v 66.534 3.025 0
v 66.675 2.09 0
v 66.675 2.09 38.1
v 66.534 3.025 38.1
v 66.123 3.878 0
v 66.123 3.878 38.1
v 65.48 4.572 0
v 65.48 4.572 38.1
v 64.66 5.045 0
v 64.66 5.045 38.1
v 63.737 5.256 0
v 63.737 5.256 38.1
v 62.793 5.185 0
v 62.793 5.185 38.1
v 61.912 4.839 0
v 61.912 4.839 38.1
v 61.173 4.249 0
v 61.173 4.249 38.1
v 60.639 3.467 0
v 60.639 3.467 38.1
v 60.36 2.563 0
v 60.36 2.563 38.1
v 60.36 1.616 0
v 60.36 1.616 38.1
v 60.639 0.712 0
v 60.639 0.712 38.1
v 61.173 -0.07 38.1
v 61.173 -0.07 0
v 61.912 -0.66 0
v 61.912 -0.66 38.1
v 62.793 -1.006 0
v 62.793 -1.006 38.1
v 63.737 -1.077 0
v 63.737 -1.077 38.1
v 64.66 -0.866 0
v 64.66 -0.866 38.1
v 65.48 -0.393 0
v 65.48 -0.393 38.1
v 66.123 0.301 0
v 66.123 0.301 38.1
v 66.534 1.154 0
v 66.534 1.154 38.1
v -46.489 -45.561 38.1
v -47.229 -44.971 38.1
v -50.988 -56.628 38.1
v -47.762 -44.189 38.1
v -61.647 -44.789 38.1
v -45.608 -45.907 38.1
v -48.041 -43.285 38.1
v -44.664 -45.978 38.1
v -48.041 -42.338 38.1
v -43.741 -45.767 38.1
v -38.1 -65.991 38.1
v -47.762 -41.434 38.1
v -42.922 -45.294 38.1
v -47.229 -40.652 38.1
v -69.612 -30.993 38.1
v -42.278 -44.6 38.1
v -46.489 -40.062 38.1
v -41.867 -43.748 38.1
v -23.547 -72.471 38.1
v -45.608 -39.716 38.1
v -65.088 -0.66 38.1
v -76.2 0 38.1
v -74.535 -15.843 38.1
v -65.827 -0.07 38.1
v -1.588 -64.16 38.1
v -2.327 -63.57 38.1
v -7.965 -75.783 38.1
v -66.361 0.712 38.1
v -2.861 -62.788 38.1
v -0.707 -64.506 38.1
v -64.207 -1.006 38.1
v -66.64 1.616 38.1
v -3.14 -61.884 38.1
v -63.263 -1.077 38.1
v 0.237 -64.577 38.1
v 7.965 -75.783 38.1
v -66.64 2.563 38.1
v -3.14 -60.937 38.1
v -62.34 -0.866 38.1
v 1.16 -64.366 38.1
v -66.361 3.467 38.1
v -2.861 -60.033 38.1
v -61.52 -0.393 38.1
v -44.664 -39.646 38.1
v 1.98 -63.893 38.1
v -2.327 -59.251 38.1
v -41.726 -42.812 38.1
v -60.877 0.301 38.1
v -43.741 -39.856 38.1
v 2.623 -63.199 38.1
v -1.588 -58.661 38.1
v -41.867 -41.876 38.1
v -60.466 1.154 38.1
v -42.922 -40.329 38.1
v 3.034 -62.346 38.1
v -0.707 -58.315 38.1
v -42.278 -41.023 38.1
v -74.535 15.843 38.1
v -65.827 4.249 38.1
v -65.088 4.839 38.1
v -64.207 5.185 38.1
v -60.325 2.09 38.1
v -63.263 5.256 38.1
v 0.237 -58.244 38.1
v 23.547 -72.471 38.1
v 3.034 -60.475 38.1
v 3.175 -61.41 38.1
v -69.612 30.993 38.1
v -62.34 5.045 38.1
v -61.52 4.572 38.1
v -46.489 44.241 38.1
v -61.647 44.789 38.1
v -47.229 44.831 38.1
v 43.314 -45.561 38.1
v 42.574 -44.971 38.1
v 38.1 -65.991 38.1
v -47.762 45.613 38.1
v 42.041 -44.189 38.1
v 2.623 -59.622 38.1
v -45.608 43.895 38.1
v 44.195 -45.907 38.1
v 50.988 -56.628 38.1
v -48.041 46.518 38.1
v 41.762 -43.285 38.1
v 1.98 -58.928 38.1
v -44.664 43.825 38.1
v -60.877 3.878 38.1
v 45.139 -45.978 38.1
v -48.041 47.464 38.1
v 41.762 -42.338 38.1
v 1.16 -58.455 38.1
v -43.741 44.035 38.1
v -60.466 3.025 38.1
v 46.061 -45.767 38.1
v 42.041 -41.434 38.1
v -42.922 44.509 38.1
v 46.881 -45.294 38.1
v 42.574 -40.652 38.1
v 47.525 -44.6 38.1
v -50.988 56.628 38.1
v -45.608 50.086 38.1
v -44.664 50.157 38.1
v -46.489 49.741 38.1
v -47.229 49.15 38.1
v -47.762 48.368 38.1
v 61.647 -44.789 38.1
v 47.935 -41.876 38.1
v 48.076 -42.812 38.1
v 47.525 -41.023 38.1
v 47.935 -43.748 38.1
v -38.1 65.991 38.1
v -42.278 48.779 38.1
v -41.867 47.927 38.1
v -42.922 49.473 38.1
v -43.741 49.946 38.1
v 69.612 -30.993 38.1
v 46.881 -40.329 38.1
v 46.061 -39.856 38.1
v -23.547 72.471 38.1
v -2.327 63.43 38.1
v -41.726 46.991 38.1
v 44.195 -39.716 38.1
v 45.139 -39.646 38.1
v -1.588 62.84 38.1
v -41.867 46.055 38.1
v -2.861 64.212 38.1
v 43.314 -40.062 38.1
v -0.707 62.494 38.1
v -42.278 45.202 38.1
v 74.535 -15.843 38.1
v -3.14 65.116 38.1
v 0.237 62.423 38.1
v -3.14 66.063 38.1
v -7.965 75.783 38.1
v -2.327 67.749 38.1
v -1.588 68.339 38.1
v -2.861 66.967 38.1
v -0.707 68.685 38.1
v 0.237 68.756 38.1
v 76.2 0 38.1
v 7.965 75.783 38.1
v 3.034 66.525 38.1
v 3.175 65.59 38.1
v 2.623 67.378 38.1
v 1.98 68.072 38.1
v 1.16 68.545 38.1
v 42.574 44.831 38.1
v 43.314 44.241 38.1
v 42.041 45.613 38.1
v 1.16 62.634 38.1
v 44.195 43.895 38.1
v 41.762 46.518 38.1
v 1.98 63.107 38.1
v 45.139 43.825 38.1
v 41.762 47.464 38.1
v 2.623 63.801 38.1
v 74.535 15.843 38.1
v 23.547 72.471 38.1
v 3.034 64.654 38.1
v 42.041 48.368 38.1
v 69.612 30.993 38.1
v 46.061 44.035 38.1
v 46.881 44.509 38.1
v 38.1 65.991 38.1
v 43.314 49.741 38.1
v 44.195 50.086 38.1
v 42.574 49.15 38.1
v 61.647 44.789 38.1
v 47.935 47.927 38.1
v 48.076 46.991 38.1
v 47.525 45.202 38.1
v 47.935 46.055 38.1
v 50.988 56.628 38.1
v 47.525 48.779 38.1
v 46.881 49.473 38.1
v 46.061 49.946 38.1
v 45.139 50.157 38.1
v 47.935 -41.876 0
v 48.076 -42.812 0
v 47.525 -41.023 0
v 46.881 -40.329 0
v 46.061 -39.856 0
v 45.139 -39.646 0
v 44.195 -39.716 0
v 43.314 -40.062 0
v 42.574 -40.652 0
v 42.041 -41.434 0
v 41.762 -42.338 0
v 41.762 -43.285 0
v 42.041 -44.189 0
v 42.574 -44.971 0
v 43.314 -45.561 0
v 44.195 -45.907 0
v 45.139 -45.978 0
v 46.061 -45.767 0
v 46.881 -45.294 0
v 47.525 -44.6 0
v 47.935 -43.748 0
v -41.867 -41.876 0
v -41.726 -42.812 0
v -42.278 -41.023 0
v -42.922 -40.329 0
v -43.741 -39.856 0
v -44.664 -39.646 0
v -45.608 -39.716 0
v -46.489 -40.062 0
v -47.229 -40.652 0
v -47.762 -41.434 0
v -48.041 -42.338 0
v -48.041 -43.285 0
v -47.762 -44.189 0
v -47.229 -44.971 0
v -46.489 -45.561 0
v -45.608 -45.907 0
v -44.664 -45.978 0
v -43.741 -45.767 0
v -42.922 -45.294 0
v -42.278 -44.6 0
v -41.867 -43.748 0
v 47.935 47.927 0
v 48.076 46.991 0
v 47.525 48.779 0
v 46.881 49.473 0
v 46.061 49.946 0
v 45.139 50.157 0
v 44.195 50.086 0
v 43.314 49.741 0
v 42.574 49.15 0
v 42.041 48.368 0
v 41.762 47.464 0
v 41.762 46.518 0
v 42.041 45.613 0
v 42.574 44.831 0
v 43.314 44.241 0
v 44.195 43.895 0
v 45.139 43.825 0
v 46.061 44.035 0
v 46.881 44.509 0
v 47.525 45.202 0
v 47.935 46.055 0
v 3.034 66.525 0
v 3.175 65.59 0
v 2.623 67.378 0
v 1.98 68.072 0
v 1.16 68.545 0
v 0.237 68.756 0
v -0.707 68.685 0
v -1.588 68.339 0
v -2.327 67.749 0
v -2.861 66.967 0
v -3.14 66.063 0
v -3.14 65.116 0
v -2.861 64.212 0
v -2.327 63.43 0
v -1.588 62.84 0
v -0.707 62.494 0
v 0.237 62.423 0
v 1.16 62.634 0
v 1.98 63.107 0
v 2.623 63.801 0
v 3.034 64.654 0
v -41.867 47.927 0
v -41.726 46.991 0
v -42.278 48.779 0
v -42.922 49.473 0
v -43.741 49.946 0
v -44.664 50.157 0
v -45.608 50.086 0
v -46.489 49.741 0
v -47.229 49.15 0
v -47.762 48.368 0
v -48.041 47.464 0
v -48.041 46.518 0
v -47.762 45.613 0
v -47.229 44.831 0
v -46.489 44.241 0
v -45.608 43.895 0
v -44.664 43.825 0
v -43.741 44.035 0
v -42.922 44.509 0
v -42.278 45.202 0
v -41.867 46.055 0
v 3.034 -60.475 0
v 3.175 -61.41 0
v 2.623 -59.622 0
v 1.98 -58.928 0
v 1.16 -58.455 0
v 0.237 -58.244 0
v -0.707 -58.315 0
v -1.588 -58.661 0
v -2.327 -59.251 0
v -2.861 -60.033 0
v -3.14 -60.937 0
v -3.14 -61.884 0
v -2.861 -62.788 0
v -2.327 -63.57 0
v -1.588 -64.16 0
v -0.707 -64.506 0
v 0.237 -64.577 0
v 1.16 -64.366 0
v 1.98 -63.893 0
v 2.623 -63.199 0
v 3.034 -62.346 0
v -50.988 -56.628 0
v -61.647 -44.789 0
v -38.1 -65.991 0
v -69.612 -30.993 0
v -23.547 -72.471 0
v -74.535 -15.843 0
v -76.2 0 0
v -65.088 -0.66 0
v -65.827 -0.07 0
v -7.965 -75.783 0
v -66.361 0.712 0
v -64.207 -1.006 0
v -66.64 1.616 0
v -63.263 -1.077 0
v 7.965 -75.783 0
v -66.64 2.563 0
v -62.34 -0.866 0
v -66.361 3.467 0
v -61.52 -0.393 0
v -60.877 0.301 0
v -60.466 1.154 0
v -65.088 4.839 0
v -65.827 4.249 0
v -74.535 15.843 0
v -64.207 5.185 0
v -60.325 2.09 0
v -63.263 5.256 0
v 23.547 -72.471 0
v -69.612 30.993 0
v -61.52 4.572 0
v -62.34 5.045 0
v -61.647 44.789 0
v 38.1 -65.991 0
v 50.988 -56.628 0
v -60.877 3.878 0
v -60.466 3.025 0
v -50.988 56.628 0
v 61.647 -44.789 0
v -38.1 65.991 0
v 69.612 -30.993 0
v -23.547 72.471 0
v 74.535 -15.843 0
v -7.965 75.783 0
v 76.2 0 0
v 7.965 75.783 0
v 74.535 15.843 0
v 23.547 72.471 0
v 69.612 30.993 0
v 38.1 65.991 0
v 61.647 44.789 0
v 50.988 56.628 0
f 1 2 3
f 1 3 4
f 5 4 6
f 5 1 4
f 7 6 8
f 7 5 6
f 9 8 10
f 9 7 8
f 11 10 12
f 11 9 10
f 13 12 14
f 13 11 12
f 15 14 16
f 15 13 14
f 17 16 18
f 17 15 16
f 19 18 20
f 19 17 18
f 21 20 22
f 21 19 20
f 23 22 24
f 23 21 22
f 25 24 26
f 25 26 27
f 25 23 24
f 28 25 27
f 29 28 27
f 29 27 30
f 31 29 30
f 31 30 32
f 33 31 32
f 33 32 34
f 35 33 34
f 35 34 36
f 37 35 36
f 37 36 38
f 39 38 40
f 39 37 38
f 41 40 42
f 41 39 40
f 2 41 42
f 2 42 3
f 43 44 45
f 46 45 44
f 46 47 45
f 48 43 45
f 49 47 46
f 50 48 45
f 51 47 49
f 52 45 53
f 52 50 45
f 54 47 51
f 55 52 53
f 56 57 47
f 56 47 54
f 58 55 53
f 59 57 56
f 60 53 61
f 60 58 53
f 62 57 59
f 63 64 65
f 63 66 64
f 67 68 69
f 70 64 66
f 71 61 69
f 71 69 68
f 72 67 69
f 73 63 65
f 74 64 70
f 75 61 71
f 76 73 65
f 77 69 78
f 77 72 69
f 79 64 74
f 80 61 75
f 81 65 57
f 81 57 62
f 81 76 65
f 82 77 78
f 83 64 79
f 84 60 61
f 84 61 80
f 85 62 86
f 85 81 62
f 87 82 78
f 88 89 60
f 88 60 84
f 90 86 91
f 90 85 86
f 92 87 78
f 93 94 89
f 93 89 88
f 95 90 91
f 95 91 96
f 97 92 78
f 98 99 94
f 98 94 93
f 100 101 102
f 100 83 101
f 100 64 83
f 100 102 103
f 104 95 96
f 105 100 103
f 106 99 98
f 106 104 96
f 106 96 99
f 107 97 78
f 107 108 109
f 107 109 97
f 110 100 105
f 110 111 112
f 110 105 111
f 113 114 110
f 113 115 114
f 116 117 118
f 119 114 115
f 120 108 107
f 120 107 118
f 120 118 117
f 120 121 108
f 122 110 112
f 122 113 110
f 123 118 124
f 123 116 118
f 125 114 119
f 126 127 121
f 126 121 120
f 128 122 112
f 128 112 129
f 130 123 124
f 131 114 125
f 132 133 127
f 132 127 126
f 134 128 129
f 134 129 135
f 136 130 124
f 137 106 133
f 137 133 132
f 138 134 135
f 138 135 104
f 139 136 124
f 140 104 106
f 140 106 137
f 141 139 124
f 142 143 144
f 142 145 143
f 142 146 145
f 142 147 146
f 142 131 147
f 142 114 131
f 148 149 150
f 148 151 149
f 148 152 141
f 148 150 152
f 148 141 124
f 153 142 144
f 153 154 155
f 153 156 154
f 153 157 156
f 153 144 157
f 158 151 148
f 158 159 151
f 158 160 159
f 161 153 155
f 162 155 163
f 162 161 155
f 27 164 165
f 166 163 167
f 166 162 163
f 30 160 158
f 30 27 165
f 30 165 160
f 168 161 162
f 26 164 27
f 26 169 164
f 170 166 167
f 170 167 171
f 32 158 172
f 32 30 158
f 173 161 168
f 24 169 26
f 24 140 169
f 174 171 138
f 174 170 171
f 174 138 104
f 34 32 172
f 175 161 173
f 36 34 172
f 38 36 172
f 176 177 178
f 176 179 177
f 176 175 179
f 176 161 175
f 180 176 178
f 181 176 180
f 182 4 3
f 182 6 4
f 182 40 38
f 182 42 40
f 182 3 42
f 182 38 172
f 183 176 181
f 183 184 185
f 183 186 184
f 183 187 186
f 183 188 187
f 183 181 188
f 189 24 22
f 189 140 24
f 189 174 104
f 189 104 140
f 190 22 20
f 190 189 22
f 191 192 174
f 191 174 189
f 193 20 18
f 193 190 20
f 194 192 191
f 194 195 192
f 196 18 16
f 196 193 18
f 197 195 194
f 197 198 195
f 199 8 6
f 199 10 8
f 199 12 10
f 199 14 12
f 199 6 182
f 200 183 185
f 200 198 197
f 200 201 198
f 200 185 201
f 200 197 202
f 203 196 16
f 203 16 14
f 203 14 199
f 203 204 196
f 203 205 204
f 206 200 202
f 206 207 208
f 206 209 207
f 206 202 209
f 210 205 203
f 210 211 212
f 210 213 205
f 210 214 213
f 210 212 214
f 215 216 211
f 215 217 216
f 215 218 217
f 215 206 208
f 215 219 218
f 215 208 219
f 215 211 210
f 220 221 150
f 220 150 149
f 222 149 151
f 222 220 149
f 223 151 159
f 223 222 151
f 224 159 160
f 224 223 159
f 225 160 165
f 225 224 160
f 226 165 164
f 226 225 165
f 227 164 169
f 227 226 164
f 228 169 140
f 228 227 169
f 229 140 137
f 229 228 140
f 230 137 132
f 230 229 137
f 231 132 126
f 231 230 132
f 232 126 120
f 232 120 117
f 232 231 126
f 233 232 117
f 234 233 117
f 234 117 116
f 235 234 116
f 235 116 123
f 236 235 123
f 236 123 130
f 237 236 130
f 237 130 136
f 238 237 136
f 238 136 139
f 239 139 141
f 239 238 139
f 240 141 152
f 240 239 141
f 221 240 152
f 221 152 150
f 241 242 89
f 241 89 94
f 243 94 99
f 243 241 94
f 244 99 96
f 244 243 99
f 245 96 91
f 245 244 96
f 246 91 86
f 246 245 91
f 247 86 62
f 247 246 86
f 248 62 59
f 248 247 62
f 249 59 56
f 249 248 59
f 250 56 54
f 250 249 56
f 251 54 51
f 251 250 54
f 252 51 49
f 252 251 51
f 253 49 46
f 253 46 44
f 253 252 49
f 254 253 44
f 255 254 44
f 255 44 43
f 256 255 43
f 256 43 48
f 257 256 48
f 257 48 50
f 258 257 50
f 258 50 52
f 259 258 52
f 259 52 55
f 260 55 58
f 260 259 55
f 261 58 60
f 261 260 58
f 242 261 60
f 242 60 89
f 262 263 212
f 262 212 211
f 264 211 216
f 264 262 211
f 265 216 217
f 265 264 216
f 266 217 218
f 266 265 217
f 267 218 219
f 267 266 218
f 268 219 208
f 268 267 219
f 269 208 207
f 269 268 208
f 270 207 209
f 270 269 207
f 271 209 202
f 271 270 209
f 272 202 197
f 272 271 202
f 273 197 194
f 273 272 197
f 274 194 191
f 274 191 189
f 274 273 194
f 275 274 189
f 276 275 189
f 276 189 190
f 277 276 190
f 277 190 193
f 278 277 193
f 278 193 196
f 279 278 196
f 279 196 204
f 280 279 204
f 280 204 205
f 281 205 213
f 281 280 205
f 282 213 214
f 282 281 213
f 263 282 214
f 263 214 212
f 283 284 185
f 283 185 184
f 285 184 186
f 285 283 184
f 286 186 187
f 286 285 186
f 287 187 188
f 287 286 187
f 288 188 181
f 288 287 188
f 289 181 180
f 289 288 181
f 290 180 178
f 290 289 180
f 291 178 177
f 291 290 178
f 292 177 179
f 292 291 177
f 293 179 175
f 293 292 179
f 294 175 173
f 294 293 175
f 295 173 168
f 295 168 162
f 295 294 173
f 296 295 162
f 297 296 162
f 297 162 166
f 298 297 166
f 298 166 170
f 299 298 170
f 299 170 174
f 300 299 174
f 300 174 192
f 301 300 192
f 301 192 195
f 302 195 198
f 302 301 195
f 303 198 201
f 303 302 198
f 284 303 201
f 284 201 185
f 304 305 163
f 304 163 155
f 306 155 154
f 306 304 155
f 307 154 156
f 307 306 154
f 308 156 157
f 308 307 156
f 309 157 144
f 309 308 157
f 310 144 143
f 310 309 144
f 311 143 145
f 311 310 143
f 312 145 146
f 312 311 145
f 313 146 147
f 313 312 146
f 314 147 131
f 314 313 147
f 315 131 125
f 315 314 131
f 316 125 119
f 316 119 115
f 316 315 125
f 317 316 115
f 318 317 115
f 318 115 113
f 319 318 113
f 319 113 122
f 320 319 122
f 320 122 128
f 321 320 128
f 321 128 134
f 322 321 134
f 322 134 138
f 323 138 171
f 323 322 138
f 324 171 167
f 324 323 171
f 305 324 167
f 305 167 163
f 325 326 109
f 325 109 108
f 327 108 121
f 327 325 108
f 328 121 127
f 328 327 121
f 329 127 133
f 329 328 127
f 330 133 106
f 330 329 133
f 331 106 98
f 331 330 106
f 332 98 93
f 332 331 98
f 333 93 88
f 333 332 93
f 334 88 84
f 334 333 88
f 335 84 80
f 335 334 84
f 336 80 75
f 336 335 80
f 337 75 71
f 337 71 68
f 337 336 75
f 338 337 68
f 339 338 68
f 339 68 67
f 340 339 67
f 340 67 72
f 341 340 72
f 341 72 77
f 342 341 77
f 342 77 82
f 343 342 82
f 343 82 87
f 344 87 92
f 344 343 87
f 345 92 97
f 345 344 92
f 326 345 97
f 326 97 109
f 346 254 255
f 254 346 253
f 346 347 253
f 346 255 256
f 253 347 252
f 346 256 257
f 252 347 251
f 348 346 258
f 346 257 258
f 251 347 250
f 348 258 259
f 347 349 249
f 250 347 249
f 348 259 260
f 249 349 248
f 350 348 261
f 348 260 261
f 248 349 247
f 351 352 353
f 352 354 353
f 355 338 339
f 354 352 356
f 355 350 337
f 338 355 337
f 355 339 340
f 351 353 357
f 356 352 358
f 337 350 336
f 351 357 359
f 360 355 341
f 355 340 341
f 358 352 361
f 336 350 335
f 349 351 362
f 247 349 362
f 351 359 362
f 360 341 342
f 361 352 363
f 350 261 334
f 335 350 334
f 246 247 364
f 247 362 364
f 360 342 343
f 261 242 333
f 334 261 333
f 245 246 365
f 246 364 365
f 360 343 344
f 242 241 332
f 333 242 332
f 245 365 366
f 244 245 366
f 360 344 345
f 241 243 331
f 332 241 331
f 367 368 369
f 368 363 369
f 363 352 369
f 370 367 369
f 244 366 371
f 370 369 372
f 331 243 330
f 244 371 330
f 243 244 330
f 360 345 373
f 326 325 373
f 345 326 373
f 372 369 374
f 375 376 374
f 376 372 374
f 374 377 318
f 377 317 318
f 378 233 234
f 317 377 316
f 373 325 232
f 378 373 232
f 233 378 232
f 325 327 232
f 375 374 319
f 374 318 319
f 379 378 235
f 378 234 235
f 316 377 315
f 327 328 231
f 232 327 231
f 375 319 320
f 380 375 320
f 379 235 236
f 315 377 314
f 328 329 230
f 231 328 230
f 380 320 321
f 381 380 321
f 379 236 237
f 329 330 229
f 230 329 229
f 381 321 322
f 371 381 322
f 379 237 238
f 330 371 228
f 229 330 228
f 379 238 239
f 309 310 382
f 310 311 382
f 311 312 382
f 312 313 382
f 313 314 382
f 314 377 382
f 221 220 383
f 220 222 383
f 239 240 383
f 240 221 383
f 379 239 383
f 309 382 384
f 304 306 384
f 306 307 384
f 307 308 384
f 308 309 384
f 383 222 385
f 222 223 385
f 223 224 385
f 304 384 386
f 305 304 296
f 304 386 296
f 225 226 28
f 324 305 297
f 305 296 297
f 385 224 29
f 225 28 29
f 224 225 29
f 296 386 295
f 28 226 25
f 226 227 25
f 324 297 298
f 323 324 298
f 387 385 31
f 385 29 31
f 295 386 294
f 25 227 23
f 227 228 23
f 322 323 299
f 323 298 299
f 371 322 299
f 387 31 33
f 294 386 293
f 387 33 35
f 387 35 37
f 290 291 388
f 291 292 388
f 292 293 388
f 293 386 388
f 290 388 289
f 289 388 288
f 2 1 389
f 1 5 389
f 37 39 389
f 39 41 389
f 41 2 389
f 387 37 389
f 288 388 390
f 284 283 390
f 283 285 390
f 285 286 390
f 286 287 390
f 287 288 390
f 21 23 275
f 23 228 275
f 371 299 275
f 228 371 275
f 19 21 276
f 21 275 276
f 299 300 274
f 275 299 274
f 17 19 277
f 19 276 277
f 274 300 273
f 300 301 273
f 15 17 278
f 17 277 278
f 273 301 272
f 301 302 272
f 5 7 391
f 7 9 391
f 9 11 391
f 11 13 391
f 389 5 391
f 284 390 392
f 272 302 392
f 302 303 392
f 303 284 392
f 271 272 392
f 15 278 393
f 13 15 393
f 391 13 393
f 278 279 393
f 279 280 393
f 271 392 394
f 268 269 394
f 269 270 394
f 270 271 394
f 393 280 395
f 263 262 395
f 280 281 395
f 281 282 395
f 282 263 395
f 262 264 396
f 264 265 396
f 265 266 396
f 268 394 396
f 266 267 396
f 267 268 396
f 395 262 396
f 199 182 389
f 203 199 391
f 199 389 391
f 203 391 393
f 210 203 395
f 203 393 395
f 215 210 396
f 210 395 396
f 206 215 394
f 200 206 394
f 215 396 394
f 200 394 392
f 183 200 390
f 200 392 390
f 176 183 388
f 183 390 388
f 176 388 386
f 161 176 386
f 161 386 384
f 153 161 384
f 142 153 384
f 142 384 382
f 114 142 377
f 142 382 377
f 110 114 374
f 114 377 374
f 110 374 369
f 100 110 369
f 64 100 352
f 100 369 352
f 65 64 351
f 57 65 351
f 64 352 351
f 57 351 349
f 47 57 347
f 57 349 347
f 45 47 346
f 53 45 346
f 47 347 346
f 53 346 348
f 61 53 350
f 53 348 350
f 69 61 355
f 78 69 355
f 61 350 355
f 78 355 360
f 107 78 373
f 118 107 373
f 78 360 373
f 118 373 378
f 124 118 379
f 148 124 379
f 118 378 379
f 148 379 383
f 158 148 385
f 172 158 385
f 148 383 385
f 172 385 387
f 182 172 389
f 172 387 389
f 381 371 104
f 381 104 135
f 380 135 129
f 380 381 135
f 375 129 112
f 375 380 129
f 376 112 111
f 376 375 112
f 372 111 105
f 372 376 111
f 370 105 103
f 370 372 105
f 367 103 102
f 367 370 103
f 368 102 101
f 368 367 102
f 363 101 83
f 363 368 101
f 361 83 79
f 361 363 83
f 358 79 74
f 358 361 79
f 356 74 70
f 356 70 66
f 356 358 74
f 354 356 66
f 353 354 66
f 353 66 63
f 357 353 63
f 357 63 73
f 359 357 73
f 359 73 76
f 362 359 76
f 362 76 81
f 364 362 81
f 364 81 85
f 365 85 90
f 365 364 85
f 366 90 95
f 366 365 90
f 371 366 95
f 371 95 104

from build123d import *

# Parameters (mm, degrees)
F0_R     = 76.2
F0_R_2   = 3.175
F1_DEPTH = 38.1


with BuildPart() as f1:
    # F0 (on Top) → F1 (new body)
    with BuildSketch(Plane.XY):
        Circle(F0_R)
        with Locations((-44.901281, -42.811689)):
            Circle(F0_R_2, mode=Mode.SUBTRACT)
        with Locations((0, -61.410408)):
            Circle(F0_R_2, mode=Mode.SUBTRACT)
        with Locations((44.901281, -42.811689)):
            Circle(F0_R_2, mode=Mode.SUBTRACT)
        with Locations((-63.5, 2.089592)):
            Circle(F0_R_2, mode=Mode.SUBTRACT)
        with Locations((-44.901281, 46.990872)):
            Circle(F0_R_2, mode=Mode.SUBTRACT)
        with Locations((63.5, 2.089592)):
            Circle(F0_R_2, mode=Mode.SUBTRACT)
        with Locations((0, 65.589592)):
            Circle(F0_R_2, mode=Mode.SUBTRACT)
        with Locations((44.901281, 46.990872)):
            Circle(F0_R_2, mode=Mode.SUBTRACT)
    extrude(amount=F1_DEPTH)


solid = f1.part
